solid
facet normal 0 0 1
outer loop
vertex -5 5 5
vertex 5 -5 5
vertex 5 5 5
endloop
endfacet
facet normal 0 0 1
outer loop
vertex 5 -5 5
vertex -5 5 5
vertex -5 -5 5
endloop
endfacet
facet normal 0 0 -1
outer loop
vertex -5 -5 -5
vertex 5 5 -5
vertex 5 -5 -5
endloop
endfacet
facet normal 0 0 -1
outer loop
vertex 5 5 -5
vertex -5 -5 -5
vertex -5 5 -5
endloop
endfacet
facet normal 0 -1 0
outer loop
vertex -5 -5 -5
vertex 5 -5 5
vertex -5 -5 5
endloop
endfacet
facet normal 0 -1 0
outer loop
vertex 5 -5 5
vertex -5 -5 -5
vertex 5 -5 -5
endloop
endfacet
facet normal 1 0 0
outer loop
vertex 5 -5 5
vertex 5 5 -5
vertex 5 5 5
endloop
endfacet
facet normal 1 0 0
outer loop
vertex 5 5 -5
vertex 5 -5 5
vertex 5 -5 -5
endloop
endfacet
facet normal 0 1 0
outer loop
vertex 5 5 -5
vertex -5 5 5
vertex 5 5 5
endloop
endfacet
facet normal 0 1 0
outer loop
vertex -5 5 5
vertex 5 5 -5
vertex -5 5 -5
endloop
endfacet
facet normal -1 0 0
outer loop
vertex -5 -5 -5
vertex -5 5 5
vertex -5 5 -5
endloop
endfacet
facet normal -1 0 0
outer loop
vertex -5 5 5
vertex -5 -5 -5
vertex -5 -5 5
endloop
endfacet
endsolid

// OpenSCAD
// $fn=80;

// module left_upper_wing_outline() {
//   difference() {
//     hull() {
//       rotate([0,0,20.37]) scale([0.4793,1,1]) circle(r=269.69);
//       translate([-93.90,0,0]) square(size=[246.49, 246.49], center=false);
//       translate([10,-240,0]) square(size=[828.48, 500], center=false);
//     }
//     color("Blue") translate([-120,246.49,0]) square(size=[2000, 246.49], center=false);
//     color("Blue") translate([-120,-223.44-246.49,0]) square(size=[2000, 246.49], center=false);
//   }
// }

// module left_lower_wing_outline() {
//   difference() {
//     hull() {
//       rotate([0,0,20.37]) scale([0.4793,1,1]) circle(r=269.69);
//       translate([-93.90,0,0]) square(size=[246.49, 246.49], center=false);
//       translate([10,-240,0]) square(size=[828.48+65.29, 500], center=false);
//     }
//     color("Blue") translate([-120,246.49,0]) square(size=[2000, 246.49], center=false);
//     color("Blue") translate([-120,-223.44-246.49,0]) square(size=[2000, 246.49], center=false);
//   }
// }

// module wing_center() {
//   difference() {
//     square(size=[460.77, 500], center=true);
//     translate([0,-223.44,0]) circle(r=97.99, $fn=6);
//     color("Blue") translate([-300,246.49,0]) square(size=[2000, 246.49], center=false);
//     color("Blue") translate([-300,-223.44-246.49,0]) square(size=[2000, 246.49], center=false);
//   }
// }

// module upper_wing_outline() {
//   linear_extrude(height=43.30, center=false, convexity=10, twist=0) {
//     translate([-838.48-(460.77/2),0,0]) left_upper_wing_outline();
//     color("orange") wing_center();
//     translate([ 838.48+(460.77/2),0,0]) mirror([1,0,0]) left_upper_wing_outline();
//   }

// }

// module lower_wing_outline() {
//   linear_extrude(height=43.30, center=false, convexity=10, twist=0) {
//     translate([-838.48-(460.77/2)+65.29,0,0]) left_lower_wing_outline();
//     // translate([ 838.48+(460.77/2)-65.29,0,0]) mirror([1,0,0]) left_lower_wing_outline();
//   }

// }

// module super_cyl() {
//   difference() {
//     translate([0,25,-1082.25+15]) scale([1,1.2,1]) rotate([0,90,0]) cylinder(r=1710.25, h=2600, center=true);
//     difference() {
//       rotate([2,0,0]) translate([0,25,-1082.25+15]) scale([1,1.2,1]) rotate([0,90,0]) cylinder(r=1110.25, h=2700, center=true);
//       //translate([0,25,-1082.25+15]) scale([1,1.2,1]) rotate([0,90,0]) cylinder(r=1082.25, h=2800, center=true);
//     }
//     translate([0,0,-3220]) cube(size=[4200, 4200, 6200], center=true);
//     translate([0,0,3220]) cube(size=[4200, 4200, 6200], center=true);
//     translate([0,-1500,-120]) cube(size=[4200, 2000, 6200], center=true);
//     translate([0,1500,-120]) cube(size=[4200, 2000, 6200], center=true);
//   }
// }

// module solid_upper_wing() {
//   difference() {
//     upper_wing_outline();
//     color("Orange") super_cyl();
//     translate([0,180,2])
//     rotate([-10,0,0])
//     difference() {
//       difference() {
//         rotate([2,0,0]) translate([0,25,0]) scale([1,1.2,1]) rotate([0,90,0]) cylinder(r=100, h=2700, center=true);
//         hull() {
//           rotate([2,0,0]) translate([0,0,0]) scale([1,1.2,1]) rotate([0,90,0]) cylinder(r=40, h=2800, center=true);
//           rotate([2,0,0]) translate([0,25,0]) scale([1,1.2,1]) rotate([0,90,0]) cylinder(r=40, h=2800, center=true);
//         }
//       }
//       translate([0,-150,0]) cube(size=[2800, 300, 300], center=true);
//     }
//   }
// }

// module solid_lower_wing() {
//   rotate([0,4.8,0])
//   difference() {
//     lower_wing_outline();
//     color("Orange") super_cyl();
//     translate([0,180,2])
//     rotate([-10,0,0])
//     difference() {
//       difference() {
//         rotate([2,0,0]) translate([0,25,0]) scale([1,1.2,1]) rotate([0,90,0]) cylinder(r=100, h=2700, center=true);
//         hull() {
//           rotate([2,0,0]) translate([0,0,0]) scale([1,1.2,1]) rotate([0,90,0]) cylinder(r=40, h=2800, center=true);
//           rotate([2,0,0]) translate([0,25,0]) scale([1,1.2,1]) rotate([0,90,0]) cylinder(r=40, h=2800, center=true);
//         }
//       }
//       translate([0,-150,0]) cube(size=[2800, 300, 300], center=true);
//     }
//   }
// }

// module framed_upper_wing() {
//   ribs = 8;
//   rib_spacing = 1050/8;

//   difference() {
//     solid_upper_wing();
//     // for (r = [-ribs : ribs]) {
//     //   translate([r*rib_spacing, 30, 0])
//     //   hull() {
//     //     translate([0, 140,0]) cylinder(r=60, h=200, center=true);
//     //     translate([0,-140,0]) cylinder(r=60, h=200, center=true);
//     //     // cube(size=[120, 340, 200], center=true);
//     //   }
//     // }
//   }
//   translate([0,100,26]) cube(size=[2400, 10, 30], center=true);
// }

// module framed_lower_wing() {
//   ribs = 8;
//   rib_spacing = 1050/8;

//   // difference() {
//     solid_lower_wing();
//     mirror([1,0,0]) solid_lower_wing();
//     // for (r = [-ribs : ribs]) {
//     //   translate([r*rib_spacing, 30, 0])
//     //   hull() {
//     //     translate([0, 140,0]) cylinder(r=60, h=200, center=true);
//     //     translate([0,-140,0]) cylinder(r=60, h=200, center=true);
//     //     // cube(size=[120, 340, 200], center=true);
//     //   }
//     // }
//   // }
// }

// module wings() {
//   translate([0,140.42,420.63+12]) rotate([2.267,0,0]) framed_upper_wing();
//   translate([0,0,12]) rotate([3.197,0,0]) framed_lower_wing();
// }

// module fuse() {
//   difference() {
//     translate([0,0,106])
//     union() {
//       rotate([90,0,180])
//       rotate_extrude(convexity = 10)
//       hull() {
//         translate([153,411,0]) square(size=[10, 10]);
//         translate([153,-254,0]) circle(30);
//         translate([116,-1086,0]) circle(30);
//         translate([0,411,0]) square(size=[10, 10]);
//         translate([0,-1110,0]) square(size=[10, 10]);
//       }
//     }

//     rotate([-9.339,0,0]) color("Orange") translate([-150,-1091.73 - 94.76,-330])    cube(size=[300, 1004.27, 300]);
//     rotate([0,0,-4.6695]) color("Orange") translate([  97.41 + 16,-1091.73-87.5,0]) cube(size=[300, 1004.27, 400]);
//     rotate([0,0,4.6695])  color("Orange") translate([-397.41 - 16,-1091.73-87.5,0]) cube(size=[300, 1004.27, 400]);

//     color("Pink") translate([  97.41,-1000,-400]) cube(size=[300, 2004.27, 800]);
//     color("Pink") translate([-397.41,-1000,-400]) cube(size=[300, 2004.27, 800]);
//     color("Pink") translate([-150,-1000,-300]) cube(size=[300, 2004.27, 300]);
//   }

//   // color("red") translate([0,0,294]) cube(size=[10, 4000, 10], center=true);
//   // color("red") translate([-20,0,-5]) cube(size=[10, 474, 10]);
// }

// module superFuse() {
//   difference() {
//     difference() {
//       union() {
//         hull() {
//           fuse();
//           translate([0,300,0])
//           hull() {
//             translate([0,121, 135]) rotate([90, 0, 0]) cylinder(r=155, h=10);
//             translate([0,-581,200-12]) sphere(r=98);
//           }
//         }
//         translate([0,418,135.5])
//         rotate([90,0,0])
//         rotate_extrude(convexity = 10)
//         translate([105, 0, 0])
//         circle(50);
//       }

//       difference() {
//         translate([0,0,139]) rotate([90,0,0]) cylinder(r=300, h=3000, center=true);
//         translate([0,0,139]) rotate([90,0,0]) cylinder(r=154, h=3100, center=true);
//       }
//       translate([0,450,135.5]) rotate([90,0,0]) cylinder(r=100, h=60, center=true);
//     }

//     translate([0,0,294])
//     linear_extrude(height=200, center=true, convexity = 10, twist = 0)
//     hull() {
//       translate([-38,19,0]) square([76,76]);
//       translate([0,-60,0]) circle(82);
//     }
//     translate([0,0,12]) rotate([3.197,0,0]) framed_lower_wing();
//   }
// }

// //wings();

// //  // Draw a NACA airfoil

// //  // calc symmetric 00xx half thickness
// // function yt (x,c,t) = t/0.2*c*(0.2969*sqrt(x/c)-0.126*(x/c)-0.3516*pow(x/c,2)+0.2843*pow(x/c,3)-0.1015*pow(x/c,4));

// // module airfoil (c,t) {
// //   step = c/80;
// //   for (i=[0:step:c]) {
// //     translate([i, 0, 0])
// //     cube([step, 0.1, 2 * (0.1+yt(i,c,t))], center=true);
// //   }
// // }

// // module test() {
// //   airfoil(50, 0.30);
// //   translate ([0,-20,0]) airfoil (50, 0.10);
// // }

// // module blend (len, c, t1, t2) {
// //   step = c/200;
// //   for (i=[0:step:c]) {
// //     assign(p1 = 0.1 + yt(i,c,t1), p2 = 0.1 + yt(i,c,t2)) {
// //       translate ([0, 0, i])
// //       polygon(points =  [
// //         [0,-p1],
// //         [0,p1],
// //         [len, p2],
// //         [len, -p2],
// //         [0, -p1] ]
// //       );
// //     }
// //   }
// // }

// // // rotate ([-90,0,0]) blend(50, 50,0.30,0.10);
// // test();


// // joinfactor = 0.125;

// // gFocalPoint = [0,0];
// // gSteps = 10;
// // gHeight = 4;

// // BezQuadCurve(
// //   [
// //     [ 0,  100],
// //     [ 5, 20],
// //     [10,  5],
// //     [15, 15]
// //   ], [0,0], gSteps, gHeight);

// //=======================================
// // Functions
// //=======================================
// function BEZ03(u) = pow((1-u), 3);
// function BEZ13(u) = 3*u*(pow((1-u),2));
// function BEZ23(u) = 3*(pow(u,2))*(1-u);
// function BEZ33(u) = pow(u,3);

// function PointAlongBez4(p0, p1, p2, p3, u) = [
//   BEZ03(u)*p0[0]+BEZ13(u)*p1[0]+BEZ23(u)*p2[0]+BEZ33(u)*p3[0],
//   BEZ03(u)*p0[1]+BEZ13(u)*p1[1]+BEZ23(u)*p2[1]+BEZ33(u)*p3[1]];


// //=======================================
// // Modules
// //=======================================
// // c - ControlPoints
// module BezQuadCurve(c, focalPoint, steps=gSteps, height=gHeight)
// {
//   // Draw control points
//   // Just comment this out when you're doing the real thing
//   for(point=[0:3]) {
//     color([point*100,0,0])
//     translate(c[point])
//     cylinder(r=1, h=height+joinfactor);
//   }

//   for(step = [steps:1])
//   {
//     linear_extrude(height = height, convexity = 10)
//     polygon(
//       points=[
//         focalPoint,
//         PointAlongBez4(c[0], c[1], c[2],c[3], step/steps),
//         PointAlongBez4(c[0], c[1], c[2],c[3], (step-1)/steps)],
//       paths=[[0,1,2,0]]
//     );
//   }
// }

// //==============================================
// // Test functions
// //==============================================
// //PlotBEZ0(100);
// //PlotBEZ1(100);
// //PlotBEZ2(100);
// //PlotBEZ3(100);
// //PlotBez4Blending();


// module PlotBEZ0(steps)
// {
//   cubeSize = 1;
//   cubeHeight = steps;

//   for (step=[0:steps])
//   {
//     translate([cubeSize*step, 0, 0])
//     cube(size=[cubeSize, cubeSize, BEZ03(step/steps)*cubeHeight]);
//   }
// }

// module PlotBEZ1(steps)
// {
//   cubeSize = 1;
//   cubeHeight = steps;

//   for (step=[0:steps])
//   {
//     translate([cubeSize*step, 0, 0])
//     cube(size=[cubeSize, cubeSize, BEZ13(step/steps)*cubeHeight]);
//   }
// }

// module PlotBEZ2(steps)
// {
//   cubeSize = 1;
//   cubeHeight = steps;

//   for (step=[0:steps])
//   {
//     translate([cubeSize*step, 0, 0])
//     cube(size=[cubeSize, cubeSize, BEZ23(step/steps)*cubeHeight]);
//   }
// }

// module PlotBEZ3(steps)
// {
//   cubeSize = 1;
//   cubeHeight = steps;

//   for (step=[0:steps])
//   {
//     translate([cubeSize*step, 0, 0])
//     cube(size=[cubeSize, cubeSize, BEZ33(step/steps)*cubeHeight]);
//   }
// }

// module PlotBez4Blending()
// {
//   sizing = 100;

//   translate([0, 0, sizing + 10])
//   PlotBEZ0(100);

//   translate([sizing+10, 0, sizing + 10])
//   PlotBEZ1(100);

//   translate([0, 0, 0])
//   PlotBEZ2(100);

//   translate([sizing+10, 0, 0])
//   PlotBEZ3(100);
// }


// //  imported from https://groups.google.com/group/SketchUp3d/browse_thread/thread/68865aa2fc881e30/26a9ccea8c3c9af1 (work of TaffGoch in public domain) by david buzz (GPLv2)
// //  removed 'mcad' dependency by qharley
// //  cleaned up by feng ling (levincoolxyz)
// //  use the "use" directive, please.
// //  module airfoil() default to NACA-8412
// //  camber_max - percent figure. ( range 0-9 )
// //  camber_position - tenths   ( range 0-9 )
// //  thickness - percentage relative to chord   ( range 0-99 )

// module airfoil(camber_max = 8, camber_position = 4, thickness = 12) {

//   m = camber_max/100;
//   p = camber_position/10;
//   t = thickness/100;

//   pts = 25; // datapoints on each of upper and lower surfaces

//   function xx(i) = 1 - cos((i-1)*90/(pts-1));
//   function yt(i) = t/0.2*(0.2969*pow(xx(i),0.5) - 0.126*xx(i)-0.3516*pow(xx(i),2) + 0.2843*pow(xx(i),3) - 0.1015*pow(xx(i),4));
//   function yc(i) = xx(i)<p ? m/pow(p,2)*(2*p*xx(i) - pow(xx(i),2)) : m/pow(1-p,2)*(1 - 2*p + 2*p*xx(i) - pow(xx(i),2));
//   function xu(j) = xx(j) - yt(j)*(sin(atan((yc(j)-yc(j-1))/(xx(j)-xx(j-1)))));
//   function yu(j) = yc(j) + yt(j)*(cos(atan((yc(j)-yc(j-1))/(xx(j)-xx(j-1)))));
//   function xl(j) = xx(j) + yt(j)*(sin(atan((yc(j)-yc(j-1))/(xx(j)-xx(j-1)))));
//   function yl(j) = yc(j) - yt(j)*(cos(atan((yc(j)-yc(j-1))/(xx(j)-xx(j-1)))));

//   polygon( points=[
//   // upper side front-to-back
//   [0,0],[xu(2),yu(2)],[xu(3),yu(3)],[xu(4),yu(4)],[xu(5),yu(5)],[xu(6),yu(6)],[xu(7),yu(7)],[xu(8),yu(8)],[xu(9),yu(9)],[xu(10),yu(10)],[xu(11),yu(11)],[xu(12),yu(12)],[xu(13),yu(13)],[xu(14),yu(14)],[xu(15),yu(15)],[xu(16),yu(16)],[xu(17),yu(17)],[xu(18),yu(18)],[xu(19),yu(19)],[xu(20),yu(20)],[xu(21),yu(21)],[xu(22),yu(22)],[xu(23),yu(23)],[xu(24),yu(24)],[xu(25),yu(25)],
//   // lower side back to front
//   [xl(25),yl(25)],[xl(24),yl(24)],[xl(23),yl(23)],[xl(22),yl(22)],[xl(21),yl(21)],[xl(20),yl(20)],[xl(19),yl(19)],[xl(18),yl(18)],[xl(17),yl(17)],[xl(16),yl(16)],[xl(15),yl(15)],[xl(14),yl(14)],[xl(13),yl(13)],[xl(12),yl(12)],[xl(11),yl(11)],[xl(10),yl(10)],[xl(9),yl(9)],[xl(8),yl(8)],[xl(7),yl(7)],[xl(6),yl(6)],[xl(5),yl(5)],[xl(4),yl(4)],[xl(3),yl(3)],[xl(2),yl(2)],
//   ] );
// }


// module af_left_upper() {
  // difference() {
  //   linear_extrude(height=43.30, center=false, convexity=10, twist=0)
  //   left_upper_wing_outline();

  //   difference() {
  //     color("Orange") translate([-300,-250,-10]) cube(size=[1400, 500, 60]);
  //     translate([400,243,10]) rotate([90,1,-90]) scale([465,205,1200]) airfoil(8,4,20);
  //   }
  // }
  cube(size=[10, 10, 10], center=true);
// }

// module af_right_upper() {
//   mirror([1,0,0]) af_left_upper();
// }

// translate([-1000,0,0]) af_left_upper();
// translate([1000,0,0]) af_right_upper();
